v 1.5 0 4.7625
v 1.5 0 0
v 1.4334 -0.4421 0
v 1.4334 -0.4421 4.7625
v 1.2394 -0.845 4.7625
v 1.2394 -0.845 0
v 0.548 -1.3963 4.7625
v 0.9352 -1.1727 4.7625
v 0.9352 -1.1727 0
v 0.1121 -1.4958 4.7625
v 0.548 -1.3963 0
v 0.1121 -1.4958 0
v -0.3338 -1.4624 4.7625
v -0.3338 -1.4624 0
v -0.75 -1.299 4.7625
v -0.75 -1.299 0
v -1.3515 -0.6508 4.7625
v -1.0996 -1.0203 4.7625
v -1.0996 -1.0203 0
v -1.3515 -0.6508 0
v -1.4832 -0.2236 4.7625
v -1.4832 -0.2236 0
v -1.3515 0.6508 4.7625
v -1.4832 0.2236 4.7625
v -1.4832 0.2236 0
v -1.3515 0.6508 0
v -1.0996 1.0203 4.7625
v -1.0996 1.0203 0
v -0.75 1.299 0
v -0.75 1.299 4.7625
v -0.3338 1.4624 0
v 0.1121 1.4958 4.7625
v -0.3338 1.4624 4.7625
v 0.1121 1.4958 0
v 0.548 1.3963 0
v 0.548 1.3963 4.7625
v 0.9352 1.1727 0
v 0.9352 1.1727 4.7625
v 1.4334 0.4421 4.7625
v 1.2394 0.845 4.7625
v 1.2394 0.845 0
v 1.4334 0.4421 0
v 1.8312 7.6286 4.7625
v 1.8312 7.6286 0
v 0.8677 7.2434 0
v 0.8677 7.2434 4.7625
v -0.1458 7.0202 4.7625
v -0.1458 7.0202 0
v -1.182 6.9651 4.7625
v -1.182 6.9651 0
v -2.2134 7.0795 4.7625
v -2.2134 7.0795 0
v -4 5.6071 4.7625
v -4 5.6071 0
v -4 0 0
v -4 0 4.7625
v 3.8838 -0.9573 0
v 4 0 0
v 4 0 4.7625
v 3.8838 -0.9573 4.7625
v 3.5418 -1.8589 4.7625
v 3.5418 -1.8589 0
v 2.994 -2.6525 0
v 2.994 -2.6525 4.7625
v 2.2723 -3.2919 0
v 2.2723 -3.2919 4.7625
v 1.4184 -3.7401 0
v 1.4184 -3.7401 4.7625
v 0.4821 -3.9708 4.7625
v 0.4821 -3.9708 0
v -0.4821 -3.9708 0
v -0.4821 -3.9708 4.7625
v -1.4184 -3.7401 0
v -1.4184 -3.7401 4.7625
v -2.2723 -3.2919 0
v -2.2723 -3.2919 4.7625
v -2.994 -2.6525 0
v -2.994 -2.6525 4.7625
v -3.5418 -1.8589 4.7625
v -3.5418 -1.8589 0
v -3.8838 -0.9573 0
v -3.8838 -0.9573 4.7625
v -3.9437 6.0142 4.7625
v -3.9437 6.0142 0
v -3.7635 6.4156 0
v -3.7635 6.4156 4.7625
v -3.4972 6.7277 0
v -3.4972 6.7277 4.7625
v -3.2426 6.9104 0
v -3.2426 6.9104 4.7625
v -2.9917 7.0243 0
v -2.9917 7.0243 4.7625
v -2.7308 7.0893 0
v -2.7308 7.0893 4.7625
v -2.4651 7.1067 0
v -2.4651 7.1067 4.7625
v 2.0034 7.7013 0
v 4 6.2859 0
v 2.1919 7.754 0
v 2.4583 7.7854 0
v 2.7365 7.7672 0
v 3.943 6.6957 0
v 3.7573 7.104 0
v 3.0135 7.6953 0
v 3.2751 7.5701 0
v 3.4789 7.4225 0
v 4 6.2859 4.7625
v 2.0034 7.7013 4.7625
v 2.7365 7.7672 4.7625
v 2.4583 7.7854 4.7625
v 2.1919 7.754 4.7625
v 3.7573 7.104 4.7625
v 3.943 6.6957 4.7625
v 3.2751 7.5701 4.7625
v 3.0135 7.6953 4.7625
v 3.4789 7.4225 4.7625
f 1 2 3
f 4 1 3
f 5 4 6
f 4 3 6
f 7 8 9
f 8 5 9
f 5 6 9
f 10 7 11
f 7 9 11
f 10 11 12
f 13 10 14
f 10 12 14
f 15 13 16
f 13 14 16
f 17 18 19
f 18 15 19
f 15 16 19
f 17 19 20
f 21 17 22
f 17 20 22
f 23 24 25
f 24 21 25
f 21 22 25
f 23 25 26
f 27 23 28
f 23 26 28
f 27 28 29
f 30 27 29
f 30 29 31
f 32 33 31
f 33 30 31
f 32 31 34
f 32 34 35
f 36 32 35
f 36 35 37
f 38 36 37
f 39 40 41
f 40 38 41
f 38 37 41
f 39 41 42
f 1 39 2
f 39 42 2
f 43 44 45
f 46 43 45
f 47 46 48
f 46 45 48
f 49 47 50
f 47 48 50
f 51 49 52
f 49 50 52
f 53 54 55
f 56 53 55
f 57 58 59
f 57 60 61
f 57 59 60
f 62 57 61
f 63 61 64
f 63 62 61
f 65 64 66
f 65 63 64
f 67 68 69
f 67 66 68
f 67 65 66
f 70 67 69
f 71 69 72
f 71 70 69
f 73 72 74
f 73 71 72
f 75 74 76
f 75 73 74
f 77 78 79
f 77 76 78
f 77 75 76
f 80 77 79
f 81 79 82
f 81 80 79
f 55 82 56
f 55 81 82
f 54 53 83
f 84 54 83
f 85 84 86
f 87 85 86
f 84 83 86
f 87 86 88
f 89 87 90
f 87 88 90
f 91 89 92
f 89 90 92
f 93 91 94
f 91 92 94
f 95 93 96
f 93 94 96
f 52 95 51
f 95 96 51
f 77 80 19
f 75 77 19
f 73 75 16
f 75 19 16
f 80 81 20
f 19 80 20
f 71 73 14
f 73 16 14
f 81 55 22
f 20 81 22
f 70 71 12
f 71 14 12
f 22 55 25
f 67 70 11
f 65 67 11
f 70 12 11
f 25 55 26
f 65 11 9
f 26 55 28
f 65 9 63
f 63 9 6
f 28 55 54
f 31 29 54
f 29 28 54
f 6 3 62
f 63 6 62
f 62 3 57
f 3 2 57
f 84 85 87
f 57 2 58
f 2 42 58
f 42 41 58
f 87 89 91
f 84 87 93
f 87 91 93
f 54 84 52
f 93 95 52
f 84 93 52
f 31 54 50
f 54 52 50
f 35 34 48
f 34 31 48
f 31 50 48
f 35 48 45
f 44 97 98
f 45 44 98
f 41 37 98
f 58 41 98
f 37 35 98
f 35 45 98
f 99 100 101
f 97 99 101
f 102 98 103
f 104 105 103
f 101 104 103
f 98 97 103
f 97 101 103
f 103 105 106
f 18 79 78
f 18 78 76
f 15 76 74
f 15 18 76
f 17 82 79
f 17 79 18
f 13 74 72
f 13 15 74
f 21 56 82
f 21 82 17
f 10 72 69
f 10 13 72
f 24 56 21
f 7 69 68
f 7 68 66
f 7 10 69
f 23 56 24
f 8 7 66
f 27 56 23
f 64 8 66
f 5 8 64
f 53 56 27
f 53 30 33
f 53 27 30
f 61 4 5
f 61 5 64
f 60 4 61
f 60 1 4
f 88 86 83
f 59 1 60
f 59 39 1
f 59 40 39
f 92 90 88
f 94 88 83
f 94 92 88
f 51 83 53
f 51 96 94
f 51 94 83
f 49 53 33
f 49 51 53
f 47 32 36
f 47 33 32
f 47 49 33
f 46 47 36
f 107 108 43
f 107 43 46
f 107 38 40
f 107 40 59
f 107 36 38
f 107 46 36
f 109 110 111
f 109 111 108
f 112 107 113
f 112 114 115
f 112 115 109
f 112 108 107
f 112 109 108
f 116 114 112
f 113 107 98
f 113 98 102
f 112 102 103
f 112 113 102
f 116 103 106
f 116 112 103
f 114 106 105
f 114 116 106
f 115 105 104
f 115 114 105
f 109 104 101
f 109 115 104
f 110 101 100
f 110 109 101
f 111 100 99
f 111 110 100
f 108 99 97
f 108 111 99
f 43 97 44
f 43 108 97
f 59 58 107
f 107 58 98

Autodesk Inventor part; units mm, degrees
ref_plane "YZ Plane" through (0, 0, 0) normal (1, 0, 0) x (0, 1, 0)
ref_plane "XZ Plane" through (0, 0, 0) normal (0, 1, 0) x (-1, 0, 0)
ref_plane "XY Plane" through (0, 0, 0) normal (0, 0, 1) x (1, 0, 0)
sketch "Sketch1" plane through (0, 0, 0) normal (0, 0, 1) x (1, 0, 0)
  circle A0 centre (0, 0) radius 1.5
  circle A1 centre (0, 0) radius 4
  circle A2 centre (0, 0) radius 7 construction
  line L0 (0, 0) -> (0, 7) construction
  circle A3 centre (-1, 13.3125) radius 6.35
  line L1 (0, 0) -> (0, 7) construction
  line L2 (4, 0) -> (4, 7)
  line L3 (-4, 7) -> (-4, 0)
  arc A4 (-4, 0) -> (4, 0) centre (0, 0) ccw
  arc A5 (4, 7) -> (-4, 7) centre (0, 7) ccw
  point P0 (0, 3.5)
  point P1 (-3.9251, 7.7702)
  point P2 (4, 0)
  point P3 (3.5364, 8.8691)
  point P4 (-4, 0)
  point P5 (-3.941, 7.6846)
  dimension "d2" = 14
  dimension "d0" = 3
  dimension "d1" = 8
  dimension "d3" = 12.7
  dimension "d4" = 4
  dimension "d9" = 1
extrude "Extrusion1" add sketch "Sketch1" along normal blind 4.7625 contours A1 | A1 L3 A5 A3 L2
fillet "Fillet1" radius 1.5 2 edges at (3.5364, 8.8691, 2.3813) (-3.941, 7.6846, 2.3813)
sketch "Sketch2" plane through (0, 0, 0) normal (0, 0, -1) x (-1, 0, 0)
  arc A0 (4, 5.6071) -> (2.2134, 7.0795) centre (2.5, 5.6071) ccw projected
  arc A1 (-1.8312, 7.6286) -> (2.2134, 7.0795) centre (1, 13.3125) ccw projected
  arc A2 (-1.8312, 7.6286) -> (-4, 6.2859) centre (-2.5, 6.2859) ccw projected
  line L0 (-4, 0) -> (-4, 6.2859) projected
  arc A3 (-4, 0) -> (4, 0) centre (0, 0) ccw projected
  line L1 (4, 5.6071) -> (4, 0) projected
  circle A4 centre (0, 0) radius 1.5 projected
  circle A5 centre (0, 0) radius 8.2648 construction
equation "\"d4\" = 0.5 * d1"
properties part number "Cam - Lever" material "Nylon 6/6"
